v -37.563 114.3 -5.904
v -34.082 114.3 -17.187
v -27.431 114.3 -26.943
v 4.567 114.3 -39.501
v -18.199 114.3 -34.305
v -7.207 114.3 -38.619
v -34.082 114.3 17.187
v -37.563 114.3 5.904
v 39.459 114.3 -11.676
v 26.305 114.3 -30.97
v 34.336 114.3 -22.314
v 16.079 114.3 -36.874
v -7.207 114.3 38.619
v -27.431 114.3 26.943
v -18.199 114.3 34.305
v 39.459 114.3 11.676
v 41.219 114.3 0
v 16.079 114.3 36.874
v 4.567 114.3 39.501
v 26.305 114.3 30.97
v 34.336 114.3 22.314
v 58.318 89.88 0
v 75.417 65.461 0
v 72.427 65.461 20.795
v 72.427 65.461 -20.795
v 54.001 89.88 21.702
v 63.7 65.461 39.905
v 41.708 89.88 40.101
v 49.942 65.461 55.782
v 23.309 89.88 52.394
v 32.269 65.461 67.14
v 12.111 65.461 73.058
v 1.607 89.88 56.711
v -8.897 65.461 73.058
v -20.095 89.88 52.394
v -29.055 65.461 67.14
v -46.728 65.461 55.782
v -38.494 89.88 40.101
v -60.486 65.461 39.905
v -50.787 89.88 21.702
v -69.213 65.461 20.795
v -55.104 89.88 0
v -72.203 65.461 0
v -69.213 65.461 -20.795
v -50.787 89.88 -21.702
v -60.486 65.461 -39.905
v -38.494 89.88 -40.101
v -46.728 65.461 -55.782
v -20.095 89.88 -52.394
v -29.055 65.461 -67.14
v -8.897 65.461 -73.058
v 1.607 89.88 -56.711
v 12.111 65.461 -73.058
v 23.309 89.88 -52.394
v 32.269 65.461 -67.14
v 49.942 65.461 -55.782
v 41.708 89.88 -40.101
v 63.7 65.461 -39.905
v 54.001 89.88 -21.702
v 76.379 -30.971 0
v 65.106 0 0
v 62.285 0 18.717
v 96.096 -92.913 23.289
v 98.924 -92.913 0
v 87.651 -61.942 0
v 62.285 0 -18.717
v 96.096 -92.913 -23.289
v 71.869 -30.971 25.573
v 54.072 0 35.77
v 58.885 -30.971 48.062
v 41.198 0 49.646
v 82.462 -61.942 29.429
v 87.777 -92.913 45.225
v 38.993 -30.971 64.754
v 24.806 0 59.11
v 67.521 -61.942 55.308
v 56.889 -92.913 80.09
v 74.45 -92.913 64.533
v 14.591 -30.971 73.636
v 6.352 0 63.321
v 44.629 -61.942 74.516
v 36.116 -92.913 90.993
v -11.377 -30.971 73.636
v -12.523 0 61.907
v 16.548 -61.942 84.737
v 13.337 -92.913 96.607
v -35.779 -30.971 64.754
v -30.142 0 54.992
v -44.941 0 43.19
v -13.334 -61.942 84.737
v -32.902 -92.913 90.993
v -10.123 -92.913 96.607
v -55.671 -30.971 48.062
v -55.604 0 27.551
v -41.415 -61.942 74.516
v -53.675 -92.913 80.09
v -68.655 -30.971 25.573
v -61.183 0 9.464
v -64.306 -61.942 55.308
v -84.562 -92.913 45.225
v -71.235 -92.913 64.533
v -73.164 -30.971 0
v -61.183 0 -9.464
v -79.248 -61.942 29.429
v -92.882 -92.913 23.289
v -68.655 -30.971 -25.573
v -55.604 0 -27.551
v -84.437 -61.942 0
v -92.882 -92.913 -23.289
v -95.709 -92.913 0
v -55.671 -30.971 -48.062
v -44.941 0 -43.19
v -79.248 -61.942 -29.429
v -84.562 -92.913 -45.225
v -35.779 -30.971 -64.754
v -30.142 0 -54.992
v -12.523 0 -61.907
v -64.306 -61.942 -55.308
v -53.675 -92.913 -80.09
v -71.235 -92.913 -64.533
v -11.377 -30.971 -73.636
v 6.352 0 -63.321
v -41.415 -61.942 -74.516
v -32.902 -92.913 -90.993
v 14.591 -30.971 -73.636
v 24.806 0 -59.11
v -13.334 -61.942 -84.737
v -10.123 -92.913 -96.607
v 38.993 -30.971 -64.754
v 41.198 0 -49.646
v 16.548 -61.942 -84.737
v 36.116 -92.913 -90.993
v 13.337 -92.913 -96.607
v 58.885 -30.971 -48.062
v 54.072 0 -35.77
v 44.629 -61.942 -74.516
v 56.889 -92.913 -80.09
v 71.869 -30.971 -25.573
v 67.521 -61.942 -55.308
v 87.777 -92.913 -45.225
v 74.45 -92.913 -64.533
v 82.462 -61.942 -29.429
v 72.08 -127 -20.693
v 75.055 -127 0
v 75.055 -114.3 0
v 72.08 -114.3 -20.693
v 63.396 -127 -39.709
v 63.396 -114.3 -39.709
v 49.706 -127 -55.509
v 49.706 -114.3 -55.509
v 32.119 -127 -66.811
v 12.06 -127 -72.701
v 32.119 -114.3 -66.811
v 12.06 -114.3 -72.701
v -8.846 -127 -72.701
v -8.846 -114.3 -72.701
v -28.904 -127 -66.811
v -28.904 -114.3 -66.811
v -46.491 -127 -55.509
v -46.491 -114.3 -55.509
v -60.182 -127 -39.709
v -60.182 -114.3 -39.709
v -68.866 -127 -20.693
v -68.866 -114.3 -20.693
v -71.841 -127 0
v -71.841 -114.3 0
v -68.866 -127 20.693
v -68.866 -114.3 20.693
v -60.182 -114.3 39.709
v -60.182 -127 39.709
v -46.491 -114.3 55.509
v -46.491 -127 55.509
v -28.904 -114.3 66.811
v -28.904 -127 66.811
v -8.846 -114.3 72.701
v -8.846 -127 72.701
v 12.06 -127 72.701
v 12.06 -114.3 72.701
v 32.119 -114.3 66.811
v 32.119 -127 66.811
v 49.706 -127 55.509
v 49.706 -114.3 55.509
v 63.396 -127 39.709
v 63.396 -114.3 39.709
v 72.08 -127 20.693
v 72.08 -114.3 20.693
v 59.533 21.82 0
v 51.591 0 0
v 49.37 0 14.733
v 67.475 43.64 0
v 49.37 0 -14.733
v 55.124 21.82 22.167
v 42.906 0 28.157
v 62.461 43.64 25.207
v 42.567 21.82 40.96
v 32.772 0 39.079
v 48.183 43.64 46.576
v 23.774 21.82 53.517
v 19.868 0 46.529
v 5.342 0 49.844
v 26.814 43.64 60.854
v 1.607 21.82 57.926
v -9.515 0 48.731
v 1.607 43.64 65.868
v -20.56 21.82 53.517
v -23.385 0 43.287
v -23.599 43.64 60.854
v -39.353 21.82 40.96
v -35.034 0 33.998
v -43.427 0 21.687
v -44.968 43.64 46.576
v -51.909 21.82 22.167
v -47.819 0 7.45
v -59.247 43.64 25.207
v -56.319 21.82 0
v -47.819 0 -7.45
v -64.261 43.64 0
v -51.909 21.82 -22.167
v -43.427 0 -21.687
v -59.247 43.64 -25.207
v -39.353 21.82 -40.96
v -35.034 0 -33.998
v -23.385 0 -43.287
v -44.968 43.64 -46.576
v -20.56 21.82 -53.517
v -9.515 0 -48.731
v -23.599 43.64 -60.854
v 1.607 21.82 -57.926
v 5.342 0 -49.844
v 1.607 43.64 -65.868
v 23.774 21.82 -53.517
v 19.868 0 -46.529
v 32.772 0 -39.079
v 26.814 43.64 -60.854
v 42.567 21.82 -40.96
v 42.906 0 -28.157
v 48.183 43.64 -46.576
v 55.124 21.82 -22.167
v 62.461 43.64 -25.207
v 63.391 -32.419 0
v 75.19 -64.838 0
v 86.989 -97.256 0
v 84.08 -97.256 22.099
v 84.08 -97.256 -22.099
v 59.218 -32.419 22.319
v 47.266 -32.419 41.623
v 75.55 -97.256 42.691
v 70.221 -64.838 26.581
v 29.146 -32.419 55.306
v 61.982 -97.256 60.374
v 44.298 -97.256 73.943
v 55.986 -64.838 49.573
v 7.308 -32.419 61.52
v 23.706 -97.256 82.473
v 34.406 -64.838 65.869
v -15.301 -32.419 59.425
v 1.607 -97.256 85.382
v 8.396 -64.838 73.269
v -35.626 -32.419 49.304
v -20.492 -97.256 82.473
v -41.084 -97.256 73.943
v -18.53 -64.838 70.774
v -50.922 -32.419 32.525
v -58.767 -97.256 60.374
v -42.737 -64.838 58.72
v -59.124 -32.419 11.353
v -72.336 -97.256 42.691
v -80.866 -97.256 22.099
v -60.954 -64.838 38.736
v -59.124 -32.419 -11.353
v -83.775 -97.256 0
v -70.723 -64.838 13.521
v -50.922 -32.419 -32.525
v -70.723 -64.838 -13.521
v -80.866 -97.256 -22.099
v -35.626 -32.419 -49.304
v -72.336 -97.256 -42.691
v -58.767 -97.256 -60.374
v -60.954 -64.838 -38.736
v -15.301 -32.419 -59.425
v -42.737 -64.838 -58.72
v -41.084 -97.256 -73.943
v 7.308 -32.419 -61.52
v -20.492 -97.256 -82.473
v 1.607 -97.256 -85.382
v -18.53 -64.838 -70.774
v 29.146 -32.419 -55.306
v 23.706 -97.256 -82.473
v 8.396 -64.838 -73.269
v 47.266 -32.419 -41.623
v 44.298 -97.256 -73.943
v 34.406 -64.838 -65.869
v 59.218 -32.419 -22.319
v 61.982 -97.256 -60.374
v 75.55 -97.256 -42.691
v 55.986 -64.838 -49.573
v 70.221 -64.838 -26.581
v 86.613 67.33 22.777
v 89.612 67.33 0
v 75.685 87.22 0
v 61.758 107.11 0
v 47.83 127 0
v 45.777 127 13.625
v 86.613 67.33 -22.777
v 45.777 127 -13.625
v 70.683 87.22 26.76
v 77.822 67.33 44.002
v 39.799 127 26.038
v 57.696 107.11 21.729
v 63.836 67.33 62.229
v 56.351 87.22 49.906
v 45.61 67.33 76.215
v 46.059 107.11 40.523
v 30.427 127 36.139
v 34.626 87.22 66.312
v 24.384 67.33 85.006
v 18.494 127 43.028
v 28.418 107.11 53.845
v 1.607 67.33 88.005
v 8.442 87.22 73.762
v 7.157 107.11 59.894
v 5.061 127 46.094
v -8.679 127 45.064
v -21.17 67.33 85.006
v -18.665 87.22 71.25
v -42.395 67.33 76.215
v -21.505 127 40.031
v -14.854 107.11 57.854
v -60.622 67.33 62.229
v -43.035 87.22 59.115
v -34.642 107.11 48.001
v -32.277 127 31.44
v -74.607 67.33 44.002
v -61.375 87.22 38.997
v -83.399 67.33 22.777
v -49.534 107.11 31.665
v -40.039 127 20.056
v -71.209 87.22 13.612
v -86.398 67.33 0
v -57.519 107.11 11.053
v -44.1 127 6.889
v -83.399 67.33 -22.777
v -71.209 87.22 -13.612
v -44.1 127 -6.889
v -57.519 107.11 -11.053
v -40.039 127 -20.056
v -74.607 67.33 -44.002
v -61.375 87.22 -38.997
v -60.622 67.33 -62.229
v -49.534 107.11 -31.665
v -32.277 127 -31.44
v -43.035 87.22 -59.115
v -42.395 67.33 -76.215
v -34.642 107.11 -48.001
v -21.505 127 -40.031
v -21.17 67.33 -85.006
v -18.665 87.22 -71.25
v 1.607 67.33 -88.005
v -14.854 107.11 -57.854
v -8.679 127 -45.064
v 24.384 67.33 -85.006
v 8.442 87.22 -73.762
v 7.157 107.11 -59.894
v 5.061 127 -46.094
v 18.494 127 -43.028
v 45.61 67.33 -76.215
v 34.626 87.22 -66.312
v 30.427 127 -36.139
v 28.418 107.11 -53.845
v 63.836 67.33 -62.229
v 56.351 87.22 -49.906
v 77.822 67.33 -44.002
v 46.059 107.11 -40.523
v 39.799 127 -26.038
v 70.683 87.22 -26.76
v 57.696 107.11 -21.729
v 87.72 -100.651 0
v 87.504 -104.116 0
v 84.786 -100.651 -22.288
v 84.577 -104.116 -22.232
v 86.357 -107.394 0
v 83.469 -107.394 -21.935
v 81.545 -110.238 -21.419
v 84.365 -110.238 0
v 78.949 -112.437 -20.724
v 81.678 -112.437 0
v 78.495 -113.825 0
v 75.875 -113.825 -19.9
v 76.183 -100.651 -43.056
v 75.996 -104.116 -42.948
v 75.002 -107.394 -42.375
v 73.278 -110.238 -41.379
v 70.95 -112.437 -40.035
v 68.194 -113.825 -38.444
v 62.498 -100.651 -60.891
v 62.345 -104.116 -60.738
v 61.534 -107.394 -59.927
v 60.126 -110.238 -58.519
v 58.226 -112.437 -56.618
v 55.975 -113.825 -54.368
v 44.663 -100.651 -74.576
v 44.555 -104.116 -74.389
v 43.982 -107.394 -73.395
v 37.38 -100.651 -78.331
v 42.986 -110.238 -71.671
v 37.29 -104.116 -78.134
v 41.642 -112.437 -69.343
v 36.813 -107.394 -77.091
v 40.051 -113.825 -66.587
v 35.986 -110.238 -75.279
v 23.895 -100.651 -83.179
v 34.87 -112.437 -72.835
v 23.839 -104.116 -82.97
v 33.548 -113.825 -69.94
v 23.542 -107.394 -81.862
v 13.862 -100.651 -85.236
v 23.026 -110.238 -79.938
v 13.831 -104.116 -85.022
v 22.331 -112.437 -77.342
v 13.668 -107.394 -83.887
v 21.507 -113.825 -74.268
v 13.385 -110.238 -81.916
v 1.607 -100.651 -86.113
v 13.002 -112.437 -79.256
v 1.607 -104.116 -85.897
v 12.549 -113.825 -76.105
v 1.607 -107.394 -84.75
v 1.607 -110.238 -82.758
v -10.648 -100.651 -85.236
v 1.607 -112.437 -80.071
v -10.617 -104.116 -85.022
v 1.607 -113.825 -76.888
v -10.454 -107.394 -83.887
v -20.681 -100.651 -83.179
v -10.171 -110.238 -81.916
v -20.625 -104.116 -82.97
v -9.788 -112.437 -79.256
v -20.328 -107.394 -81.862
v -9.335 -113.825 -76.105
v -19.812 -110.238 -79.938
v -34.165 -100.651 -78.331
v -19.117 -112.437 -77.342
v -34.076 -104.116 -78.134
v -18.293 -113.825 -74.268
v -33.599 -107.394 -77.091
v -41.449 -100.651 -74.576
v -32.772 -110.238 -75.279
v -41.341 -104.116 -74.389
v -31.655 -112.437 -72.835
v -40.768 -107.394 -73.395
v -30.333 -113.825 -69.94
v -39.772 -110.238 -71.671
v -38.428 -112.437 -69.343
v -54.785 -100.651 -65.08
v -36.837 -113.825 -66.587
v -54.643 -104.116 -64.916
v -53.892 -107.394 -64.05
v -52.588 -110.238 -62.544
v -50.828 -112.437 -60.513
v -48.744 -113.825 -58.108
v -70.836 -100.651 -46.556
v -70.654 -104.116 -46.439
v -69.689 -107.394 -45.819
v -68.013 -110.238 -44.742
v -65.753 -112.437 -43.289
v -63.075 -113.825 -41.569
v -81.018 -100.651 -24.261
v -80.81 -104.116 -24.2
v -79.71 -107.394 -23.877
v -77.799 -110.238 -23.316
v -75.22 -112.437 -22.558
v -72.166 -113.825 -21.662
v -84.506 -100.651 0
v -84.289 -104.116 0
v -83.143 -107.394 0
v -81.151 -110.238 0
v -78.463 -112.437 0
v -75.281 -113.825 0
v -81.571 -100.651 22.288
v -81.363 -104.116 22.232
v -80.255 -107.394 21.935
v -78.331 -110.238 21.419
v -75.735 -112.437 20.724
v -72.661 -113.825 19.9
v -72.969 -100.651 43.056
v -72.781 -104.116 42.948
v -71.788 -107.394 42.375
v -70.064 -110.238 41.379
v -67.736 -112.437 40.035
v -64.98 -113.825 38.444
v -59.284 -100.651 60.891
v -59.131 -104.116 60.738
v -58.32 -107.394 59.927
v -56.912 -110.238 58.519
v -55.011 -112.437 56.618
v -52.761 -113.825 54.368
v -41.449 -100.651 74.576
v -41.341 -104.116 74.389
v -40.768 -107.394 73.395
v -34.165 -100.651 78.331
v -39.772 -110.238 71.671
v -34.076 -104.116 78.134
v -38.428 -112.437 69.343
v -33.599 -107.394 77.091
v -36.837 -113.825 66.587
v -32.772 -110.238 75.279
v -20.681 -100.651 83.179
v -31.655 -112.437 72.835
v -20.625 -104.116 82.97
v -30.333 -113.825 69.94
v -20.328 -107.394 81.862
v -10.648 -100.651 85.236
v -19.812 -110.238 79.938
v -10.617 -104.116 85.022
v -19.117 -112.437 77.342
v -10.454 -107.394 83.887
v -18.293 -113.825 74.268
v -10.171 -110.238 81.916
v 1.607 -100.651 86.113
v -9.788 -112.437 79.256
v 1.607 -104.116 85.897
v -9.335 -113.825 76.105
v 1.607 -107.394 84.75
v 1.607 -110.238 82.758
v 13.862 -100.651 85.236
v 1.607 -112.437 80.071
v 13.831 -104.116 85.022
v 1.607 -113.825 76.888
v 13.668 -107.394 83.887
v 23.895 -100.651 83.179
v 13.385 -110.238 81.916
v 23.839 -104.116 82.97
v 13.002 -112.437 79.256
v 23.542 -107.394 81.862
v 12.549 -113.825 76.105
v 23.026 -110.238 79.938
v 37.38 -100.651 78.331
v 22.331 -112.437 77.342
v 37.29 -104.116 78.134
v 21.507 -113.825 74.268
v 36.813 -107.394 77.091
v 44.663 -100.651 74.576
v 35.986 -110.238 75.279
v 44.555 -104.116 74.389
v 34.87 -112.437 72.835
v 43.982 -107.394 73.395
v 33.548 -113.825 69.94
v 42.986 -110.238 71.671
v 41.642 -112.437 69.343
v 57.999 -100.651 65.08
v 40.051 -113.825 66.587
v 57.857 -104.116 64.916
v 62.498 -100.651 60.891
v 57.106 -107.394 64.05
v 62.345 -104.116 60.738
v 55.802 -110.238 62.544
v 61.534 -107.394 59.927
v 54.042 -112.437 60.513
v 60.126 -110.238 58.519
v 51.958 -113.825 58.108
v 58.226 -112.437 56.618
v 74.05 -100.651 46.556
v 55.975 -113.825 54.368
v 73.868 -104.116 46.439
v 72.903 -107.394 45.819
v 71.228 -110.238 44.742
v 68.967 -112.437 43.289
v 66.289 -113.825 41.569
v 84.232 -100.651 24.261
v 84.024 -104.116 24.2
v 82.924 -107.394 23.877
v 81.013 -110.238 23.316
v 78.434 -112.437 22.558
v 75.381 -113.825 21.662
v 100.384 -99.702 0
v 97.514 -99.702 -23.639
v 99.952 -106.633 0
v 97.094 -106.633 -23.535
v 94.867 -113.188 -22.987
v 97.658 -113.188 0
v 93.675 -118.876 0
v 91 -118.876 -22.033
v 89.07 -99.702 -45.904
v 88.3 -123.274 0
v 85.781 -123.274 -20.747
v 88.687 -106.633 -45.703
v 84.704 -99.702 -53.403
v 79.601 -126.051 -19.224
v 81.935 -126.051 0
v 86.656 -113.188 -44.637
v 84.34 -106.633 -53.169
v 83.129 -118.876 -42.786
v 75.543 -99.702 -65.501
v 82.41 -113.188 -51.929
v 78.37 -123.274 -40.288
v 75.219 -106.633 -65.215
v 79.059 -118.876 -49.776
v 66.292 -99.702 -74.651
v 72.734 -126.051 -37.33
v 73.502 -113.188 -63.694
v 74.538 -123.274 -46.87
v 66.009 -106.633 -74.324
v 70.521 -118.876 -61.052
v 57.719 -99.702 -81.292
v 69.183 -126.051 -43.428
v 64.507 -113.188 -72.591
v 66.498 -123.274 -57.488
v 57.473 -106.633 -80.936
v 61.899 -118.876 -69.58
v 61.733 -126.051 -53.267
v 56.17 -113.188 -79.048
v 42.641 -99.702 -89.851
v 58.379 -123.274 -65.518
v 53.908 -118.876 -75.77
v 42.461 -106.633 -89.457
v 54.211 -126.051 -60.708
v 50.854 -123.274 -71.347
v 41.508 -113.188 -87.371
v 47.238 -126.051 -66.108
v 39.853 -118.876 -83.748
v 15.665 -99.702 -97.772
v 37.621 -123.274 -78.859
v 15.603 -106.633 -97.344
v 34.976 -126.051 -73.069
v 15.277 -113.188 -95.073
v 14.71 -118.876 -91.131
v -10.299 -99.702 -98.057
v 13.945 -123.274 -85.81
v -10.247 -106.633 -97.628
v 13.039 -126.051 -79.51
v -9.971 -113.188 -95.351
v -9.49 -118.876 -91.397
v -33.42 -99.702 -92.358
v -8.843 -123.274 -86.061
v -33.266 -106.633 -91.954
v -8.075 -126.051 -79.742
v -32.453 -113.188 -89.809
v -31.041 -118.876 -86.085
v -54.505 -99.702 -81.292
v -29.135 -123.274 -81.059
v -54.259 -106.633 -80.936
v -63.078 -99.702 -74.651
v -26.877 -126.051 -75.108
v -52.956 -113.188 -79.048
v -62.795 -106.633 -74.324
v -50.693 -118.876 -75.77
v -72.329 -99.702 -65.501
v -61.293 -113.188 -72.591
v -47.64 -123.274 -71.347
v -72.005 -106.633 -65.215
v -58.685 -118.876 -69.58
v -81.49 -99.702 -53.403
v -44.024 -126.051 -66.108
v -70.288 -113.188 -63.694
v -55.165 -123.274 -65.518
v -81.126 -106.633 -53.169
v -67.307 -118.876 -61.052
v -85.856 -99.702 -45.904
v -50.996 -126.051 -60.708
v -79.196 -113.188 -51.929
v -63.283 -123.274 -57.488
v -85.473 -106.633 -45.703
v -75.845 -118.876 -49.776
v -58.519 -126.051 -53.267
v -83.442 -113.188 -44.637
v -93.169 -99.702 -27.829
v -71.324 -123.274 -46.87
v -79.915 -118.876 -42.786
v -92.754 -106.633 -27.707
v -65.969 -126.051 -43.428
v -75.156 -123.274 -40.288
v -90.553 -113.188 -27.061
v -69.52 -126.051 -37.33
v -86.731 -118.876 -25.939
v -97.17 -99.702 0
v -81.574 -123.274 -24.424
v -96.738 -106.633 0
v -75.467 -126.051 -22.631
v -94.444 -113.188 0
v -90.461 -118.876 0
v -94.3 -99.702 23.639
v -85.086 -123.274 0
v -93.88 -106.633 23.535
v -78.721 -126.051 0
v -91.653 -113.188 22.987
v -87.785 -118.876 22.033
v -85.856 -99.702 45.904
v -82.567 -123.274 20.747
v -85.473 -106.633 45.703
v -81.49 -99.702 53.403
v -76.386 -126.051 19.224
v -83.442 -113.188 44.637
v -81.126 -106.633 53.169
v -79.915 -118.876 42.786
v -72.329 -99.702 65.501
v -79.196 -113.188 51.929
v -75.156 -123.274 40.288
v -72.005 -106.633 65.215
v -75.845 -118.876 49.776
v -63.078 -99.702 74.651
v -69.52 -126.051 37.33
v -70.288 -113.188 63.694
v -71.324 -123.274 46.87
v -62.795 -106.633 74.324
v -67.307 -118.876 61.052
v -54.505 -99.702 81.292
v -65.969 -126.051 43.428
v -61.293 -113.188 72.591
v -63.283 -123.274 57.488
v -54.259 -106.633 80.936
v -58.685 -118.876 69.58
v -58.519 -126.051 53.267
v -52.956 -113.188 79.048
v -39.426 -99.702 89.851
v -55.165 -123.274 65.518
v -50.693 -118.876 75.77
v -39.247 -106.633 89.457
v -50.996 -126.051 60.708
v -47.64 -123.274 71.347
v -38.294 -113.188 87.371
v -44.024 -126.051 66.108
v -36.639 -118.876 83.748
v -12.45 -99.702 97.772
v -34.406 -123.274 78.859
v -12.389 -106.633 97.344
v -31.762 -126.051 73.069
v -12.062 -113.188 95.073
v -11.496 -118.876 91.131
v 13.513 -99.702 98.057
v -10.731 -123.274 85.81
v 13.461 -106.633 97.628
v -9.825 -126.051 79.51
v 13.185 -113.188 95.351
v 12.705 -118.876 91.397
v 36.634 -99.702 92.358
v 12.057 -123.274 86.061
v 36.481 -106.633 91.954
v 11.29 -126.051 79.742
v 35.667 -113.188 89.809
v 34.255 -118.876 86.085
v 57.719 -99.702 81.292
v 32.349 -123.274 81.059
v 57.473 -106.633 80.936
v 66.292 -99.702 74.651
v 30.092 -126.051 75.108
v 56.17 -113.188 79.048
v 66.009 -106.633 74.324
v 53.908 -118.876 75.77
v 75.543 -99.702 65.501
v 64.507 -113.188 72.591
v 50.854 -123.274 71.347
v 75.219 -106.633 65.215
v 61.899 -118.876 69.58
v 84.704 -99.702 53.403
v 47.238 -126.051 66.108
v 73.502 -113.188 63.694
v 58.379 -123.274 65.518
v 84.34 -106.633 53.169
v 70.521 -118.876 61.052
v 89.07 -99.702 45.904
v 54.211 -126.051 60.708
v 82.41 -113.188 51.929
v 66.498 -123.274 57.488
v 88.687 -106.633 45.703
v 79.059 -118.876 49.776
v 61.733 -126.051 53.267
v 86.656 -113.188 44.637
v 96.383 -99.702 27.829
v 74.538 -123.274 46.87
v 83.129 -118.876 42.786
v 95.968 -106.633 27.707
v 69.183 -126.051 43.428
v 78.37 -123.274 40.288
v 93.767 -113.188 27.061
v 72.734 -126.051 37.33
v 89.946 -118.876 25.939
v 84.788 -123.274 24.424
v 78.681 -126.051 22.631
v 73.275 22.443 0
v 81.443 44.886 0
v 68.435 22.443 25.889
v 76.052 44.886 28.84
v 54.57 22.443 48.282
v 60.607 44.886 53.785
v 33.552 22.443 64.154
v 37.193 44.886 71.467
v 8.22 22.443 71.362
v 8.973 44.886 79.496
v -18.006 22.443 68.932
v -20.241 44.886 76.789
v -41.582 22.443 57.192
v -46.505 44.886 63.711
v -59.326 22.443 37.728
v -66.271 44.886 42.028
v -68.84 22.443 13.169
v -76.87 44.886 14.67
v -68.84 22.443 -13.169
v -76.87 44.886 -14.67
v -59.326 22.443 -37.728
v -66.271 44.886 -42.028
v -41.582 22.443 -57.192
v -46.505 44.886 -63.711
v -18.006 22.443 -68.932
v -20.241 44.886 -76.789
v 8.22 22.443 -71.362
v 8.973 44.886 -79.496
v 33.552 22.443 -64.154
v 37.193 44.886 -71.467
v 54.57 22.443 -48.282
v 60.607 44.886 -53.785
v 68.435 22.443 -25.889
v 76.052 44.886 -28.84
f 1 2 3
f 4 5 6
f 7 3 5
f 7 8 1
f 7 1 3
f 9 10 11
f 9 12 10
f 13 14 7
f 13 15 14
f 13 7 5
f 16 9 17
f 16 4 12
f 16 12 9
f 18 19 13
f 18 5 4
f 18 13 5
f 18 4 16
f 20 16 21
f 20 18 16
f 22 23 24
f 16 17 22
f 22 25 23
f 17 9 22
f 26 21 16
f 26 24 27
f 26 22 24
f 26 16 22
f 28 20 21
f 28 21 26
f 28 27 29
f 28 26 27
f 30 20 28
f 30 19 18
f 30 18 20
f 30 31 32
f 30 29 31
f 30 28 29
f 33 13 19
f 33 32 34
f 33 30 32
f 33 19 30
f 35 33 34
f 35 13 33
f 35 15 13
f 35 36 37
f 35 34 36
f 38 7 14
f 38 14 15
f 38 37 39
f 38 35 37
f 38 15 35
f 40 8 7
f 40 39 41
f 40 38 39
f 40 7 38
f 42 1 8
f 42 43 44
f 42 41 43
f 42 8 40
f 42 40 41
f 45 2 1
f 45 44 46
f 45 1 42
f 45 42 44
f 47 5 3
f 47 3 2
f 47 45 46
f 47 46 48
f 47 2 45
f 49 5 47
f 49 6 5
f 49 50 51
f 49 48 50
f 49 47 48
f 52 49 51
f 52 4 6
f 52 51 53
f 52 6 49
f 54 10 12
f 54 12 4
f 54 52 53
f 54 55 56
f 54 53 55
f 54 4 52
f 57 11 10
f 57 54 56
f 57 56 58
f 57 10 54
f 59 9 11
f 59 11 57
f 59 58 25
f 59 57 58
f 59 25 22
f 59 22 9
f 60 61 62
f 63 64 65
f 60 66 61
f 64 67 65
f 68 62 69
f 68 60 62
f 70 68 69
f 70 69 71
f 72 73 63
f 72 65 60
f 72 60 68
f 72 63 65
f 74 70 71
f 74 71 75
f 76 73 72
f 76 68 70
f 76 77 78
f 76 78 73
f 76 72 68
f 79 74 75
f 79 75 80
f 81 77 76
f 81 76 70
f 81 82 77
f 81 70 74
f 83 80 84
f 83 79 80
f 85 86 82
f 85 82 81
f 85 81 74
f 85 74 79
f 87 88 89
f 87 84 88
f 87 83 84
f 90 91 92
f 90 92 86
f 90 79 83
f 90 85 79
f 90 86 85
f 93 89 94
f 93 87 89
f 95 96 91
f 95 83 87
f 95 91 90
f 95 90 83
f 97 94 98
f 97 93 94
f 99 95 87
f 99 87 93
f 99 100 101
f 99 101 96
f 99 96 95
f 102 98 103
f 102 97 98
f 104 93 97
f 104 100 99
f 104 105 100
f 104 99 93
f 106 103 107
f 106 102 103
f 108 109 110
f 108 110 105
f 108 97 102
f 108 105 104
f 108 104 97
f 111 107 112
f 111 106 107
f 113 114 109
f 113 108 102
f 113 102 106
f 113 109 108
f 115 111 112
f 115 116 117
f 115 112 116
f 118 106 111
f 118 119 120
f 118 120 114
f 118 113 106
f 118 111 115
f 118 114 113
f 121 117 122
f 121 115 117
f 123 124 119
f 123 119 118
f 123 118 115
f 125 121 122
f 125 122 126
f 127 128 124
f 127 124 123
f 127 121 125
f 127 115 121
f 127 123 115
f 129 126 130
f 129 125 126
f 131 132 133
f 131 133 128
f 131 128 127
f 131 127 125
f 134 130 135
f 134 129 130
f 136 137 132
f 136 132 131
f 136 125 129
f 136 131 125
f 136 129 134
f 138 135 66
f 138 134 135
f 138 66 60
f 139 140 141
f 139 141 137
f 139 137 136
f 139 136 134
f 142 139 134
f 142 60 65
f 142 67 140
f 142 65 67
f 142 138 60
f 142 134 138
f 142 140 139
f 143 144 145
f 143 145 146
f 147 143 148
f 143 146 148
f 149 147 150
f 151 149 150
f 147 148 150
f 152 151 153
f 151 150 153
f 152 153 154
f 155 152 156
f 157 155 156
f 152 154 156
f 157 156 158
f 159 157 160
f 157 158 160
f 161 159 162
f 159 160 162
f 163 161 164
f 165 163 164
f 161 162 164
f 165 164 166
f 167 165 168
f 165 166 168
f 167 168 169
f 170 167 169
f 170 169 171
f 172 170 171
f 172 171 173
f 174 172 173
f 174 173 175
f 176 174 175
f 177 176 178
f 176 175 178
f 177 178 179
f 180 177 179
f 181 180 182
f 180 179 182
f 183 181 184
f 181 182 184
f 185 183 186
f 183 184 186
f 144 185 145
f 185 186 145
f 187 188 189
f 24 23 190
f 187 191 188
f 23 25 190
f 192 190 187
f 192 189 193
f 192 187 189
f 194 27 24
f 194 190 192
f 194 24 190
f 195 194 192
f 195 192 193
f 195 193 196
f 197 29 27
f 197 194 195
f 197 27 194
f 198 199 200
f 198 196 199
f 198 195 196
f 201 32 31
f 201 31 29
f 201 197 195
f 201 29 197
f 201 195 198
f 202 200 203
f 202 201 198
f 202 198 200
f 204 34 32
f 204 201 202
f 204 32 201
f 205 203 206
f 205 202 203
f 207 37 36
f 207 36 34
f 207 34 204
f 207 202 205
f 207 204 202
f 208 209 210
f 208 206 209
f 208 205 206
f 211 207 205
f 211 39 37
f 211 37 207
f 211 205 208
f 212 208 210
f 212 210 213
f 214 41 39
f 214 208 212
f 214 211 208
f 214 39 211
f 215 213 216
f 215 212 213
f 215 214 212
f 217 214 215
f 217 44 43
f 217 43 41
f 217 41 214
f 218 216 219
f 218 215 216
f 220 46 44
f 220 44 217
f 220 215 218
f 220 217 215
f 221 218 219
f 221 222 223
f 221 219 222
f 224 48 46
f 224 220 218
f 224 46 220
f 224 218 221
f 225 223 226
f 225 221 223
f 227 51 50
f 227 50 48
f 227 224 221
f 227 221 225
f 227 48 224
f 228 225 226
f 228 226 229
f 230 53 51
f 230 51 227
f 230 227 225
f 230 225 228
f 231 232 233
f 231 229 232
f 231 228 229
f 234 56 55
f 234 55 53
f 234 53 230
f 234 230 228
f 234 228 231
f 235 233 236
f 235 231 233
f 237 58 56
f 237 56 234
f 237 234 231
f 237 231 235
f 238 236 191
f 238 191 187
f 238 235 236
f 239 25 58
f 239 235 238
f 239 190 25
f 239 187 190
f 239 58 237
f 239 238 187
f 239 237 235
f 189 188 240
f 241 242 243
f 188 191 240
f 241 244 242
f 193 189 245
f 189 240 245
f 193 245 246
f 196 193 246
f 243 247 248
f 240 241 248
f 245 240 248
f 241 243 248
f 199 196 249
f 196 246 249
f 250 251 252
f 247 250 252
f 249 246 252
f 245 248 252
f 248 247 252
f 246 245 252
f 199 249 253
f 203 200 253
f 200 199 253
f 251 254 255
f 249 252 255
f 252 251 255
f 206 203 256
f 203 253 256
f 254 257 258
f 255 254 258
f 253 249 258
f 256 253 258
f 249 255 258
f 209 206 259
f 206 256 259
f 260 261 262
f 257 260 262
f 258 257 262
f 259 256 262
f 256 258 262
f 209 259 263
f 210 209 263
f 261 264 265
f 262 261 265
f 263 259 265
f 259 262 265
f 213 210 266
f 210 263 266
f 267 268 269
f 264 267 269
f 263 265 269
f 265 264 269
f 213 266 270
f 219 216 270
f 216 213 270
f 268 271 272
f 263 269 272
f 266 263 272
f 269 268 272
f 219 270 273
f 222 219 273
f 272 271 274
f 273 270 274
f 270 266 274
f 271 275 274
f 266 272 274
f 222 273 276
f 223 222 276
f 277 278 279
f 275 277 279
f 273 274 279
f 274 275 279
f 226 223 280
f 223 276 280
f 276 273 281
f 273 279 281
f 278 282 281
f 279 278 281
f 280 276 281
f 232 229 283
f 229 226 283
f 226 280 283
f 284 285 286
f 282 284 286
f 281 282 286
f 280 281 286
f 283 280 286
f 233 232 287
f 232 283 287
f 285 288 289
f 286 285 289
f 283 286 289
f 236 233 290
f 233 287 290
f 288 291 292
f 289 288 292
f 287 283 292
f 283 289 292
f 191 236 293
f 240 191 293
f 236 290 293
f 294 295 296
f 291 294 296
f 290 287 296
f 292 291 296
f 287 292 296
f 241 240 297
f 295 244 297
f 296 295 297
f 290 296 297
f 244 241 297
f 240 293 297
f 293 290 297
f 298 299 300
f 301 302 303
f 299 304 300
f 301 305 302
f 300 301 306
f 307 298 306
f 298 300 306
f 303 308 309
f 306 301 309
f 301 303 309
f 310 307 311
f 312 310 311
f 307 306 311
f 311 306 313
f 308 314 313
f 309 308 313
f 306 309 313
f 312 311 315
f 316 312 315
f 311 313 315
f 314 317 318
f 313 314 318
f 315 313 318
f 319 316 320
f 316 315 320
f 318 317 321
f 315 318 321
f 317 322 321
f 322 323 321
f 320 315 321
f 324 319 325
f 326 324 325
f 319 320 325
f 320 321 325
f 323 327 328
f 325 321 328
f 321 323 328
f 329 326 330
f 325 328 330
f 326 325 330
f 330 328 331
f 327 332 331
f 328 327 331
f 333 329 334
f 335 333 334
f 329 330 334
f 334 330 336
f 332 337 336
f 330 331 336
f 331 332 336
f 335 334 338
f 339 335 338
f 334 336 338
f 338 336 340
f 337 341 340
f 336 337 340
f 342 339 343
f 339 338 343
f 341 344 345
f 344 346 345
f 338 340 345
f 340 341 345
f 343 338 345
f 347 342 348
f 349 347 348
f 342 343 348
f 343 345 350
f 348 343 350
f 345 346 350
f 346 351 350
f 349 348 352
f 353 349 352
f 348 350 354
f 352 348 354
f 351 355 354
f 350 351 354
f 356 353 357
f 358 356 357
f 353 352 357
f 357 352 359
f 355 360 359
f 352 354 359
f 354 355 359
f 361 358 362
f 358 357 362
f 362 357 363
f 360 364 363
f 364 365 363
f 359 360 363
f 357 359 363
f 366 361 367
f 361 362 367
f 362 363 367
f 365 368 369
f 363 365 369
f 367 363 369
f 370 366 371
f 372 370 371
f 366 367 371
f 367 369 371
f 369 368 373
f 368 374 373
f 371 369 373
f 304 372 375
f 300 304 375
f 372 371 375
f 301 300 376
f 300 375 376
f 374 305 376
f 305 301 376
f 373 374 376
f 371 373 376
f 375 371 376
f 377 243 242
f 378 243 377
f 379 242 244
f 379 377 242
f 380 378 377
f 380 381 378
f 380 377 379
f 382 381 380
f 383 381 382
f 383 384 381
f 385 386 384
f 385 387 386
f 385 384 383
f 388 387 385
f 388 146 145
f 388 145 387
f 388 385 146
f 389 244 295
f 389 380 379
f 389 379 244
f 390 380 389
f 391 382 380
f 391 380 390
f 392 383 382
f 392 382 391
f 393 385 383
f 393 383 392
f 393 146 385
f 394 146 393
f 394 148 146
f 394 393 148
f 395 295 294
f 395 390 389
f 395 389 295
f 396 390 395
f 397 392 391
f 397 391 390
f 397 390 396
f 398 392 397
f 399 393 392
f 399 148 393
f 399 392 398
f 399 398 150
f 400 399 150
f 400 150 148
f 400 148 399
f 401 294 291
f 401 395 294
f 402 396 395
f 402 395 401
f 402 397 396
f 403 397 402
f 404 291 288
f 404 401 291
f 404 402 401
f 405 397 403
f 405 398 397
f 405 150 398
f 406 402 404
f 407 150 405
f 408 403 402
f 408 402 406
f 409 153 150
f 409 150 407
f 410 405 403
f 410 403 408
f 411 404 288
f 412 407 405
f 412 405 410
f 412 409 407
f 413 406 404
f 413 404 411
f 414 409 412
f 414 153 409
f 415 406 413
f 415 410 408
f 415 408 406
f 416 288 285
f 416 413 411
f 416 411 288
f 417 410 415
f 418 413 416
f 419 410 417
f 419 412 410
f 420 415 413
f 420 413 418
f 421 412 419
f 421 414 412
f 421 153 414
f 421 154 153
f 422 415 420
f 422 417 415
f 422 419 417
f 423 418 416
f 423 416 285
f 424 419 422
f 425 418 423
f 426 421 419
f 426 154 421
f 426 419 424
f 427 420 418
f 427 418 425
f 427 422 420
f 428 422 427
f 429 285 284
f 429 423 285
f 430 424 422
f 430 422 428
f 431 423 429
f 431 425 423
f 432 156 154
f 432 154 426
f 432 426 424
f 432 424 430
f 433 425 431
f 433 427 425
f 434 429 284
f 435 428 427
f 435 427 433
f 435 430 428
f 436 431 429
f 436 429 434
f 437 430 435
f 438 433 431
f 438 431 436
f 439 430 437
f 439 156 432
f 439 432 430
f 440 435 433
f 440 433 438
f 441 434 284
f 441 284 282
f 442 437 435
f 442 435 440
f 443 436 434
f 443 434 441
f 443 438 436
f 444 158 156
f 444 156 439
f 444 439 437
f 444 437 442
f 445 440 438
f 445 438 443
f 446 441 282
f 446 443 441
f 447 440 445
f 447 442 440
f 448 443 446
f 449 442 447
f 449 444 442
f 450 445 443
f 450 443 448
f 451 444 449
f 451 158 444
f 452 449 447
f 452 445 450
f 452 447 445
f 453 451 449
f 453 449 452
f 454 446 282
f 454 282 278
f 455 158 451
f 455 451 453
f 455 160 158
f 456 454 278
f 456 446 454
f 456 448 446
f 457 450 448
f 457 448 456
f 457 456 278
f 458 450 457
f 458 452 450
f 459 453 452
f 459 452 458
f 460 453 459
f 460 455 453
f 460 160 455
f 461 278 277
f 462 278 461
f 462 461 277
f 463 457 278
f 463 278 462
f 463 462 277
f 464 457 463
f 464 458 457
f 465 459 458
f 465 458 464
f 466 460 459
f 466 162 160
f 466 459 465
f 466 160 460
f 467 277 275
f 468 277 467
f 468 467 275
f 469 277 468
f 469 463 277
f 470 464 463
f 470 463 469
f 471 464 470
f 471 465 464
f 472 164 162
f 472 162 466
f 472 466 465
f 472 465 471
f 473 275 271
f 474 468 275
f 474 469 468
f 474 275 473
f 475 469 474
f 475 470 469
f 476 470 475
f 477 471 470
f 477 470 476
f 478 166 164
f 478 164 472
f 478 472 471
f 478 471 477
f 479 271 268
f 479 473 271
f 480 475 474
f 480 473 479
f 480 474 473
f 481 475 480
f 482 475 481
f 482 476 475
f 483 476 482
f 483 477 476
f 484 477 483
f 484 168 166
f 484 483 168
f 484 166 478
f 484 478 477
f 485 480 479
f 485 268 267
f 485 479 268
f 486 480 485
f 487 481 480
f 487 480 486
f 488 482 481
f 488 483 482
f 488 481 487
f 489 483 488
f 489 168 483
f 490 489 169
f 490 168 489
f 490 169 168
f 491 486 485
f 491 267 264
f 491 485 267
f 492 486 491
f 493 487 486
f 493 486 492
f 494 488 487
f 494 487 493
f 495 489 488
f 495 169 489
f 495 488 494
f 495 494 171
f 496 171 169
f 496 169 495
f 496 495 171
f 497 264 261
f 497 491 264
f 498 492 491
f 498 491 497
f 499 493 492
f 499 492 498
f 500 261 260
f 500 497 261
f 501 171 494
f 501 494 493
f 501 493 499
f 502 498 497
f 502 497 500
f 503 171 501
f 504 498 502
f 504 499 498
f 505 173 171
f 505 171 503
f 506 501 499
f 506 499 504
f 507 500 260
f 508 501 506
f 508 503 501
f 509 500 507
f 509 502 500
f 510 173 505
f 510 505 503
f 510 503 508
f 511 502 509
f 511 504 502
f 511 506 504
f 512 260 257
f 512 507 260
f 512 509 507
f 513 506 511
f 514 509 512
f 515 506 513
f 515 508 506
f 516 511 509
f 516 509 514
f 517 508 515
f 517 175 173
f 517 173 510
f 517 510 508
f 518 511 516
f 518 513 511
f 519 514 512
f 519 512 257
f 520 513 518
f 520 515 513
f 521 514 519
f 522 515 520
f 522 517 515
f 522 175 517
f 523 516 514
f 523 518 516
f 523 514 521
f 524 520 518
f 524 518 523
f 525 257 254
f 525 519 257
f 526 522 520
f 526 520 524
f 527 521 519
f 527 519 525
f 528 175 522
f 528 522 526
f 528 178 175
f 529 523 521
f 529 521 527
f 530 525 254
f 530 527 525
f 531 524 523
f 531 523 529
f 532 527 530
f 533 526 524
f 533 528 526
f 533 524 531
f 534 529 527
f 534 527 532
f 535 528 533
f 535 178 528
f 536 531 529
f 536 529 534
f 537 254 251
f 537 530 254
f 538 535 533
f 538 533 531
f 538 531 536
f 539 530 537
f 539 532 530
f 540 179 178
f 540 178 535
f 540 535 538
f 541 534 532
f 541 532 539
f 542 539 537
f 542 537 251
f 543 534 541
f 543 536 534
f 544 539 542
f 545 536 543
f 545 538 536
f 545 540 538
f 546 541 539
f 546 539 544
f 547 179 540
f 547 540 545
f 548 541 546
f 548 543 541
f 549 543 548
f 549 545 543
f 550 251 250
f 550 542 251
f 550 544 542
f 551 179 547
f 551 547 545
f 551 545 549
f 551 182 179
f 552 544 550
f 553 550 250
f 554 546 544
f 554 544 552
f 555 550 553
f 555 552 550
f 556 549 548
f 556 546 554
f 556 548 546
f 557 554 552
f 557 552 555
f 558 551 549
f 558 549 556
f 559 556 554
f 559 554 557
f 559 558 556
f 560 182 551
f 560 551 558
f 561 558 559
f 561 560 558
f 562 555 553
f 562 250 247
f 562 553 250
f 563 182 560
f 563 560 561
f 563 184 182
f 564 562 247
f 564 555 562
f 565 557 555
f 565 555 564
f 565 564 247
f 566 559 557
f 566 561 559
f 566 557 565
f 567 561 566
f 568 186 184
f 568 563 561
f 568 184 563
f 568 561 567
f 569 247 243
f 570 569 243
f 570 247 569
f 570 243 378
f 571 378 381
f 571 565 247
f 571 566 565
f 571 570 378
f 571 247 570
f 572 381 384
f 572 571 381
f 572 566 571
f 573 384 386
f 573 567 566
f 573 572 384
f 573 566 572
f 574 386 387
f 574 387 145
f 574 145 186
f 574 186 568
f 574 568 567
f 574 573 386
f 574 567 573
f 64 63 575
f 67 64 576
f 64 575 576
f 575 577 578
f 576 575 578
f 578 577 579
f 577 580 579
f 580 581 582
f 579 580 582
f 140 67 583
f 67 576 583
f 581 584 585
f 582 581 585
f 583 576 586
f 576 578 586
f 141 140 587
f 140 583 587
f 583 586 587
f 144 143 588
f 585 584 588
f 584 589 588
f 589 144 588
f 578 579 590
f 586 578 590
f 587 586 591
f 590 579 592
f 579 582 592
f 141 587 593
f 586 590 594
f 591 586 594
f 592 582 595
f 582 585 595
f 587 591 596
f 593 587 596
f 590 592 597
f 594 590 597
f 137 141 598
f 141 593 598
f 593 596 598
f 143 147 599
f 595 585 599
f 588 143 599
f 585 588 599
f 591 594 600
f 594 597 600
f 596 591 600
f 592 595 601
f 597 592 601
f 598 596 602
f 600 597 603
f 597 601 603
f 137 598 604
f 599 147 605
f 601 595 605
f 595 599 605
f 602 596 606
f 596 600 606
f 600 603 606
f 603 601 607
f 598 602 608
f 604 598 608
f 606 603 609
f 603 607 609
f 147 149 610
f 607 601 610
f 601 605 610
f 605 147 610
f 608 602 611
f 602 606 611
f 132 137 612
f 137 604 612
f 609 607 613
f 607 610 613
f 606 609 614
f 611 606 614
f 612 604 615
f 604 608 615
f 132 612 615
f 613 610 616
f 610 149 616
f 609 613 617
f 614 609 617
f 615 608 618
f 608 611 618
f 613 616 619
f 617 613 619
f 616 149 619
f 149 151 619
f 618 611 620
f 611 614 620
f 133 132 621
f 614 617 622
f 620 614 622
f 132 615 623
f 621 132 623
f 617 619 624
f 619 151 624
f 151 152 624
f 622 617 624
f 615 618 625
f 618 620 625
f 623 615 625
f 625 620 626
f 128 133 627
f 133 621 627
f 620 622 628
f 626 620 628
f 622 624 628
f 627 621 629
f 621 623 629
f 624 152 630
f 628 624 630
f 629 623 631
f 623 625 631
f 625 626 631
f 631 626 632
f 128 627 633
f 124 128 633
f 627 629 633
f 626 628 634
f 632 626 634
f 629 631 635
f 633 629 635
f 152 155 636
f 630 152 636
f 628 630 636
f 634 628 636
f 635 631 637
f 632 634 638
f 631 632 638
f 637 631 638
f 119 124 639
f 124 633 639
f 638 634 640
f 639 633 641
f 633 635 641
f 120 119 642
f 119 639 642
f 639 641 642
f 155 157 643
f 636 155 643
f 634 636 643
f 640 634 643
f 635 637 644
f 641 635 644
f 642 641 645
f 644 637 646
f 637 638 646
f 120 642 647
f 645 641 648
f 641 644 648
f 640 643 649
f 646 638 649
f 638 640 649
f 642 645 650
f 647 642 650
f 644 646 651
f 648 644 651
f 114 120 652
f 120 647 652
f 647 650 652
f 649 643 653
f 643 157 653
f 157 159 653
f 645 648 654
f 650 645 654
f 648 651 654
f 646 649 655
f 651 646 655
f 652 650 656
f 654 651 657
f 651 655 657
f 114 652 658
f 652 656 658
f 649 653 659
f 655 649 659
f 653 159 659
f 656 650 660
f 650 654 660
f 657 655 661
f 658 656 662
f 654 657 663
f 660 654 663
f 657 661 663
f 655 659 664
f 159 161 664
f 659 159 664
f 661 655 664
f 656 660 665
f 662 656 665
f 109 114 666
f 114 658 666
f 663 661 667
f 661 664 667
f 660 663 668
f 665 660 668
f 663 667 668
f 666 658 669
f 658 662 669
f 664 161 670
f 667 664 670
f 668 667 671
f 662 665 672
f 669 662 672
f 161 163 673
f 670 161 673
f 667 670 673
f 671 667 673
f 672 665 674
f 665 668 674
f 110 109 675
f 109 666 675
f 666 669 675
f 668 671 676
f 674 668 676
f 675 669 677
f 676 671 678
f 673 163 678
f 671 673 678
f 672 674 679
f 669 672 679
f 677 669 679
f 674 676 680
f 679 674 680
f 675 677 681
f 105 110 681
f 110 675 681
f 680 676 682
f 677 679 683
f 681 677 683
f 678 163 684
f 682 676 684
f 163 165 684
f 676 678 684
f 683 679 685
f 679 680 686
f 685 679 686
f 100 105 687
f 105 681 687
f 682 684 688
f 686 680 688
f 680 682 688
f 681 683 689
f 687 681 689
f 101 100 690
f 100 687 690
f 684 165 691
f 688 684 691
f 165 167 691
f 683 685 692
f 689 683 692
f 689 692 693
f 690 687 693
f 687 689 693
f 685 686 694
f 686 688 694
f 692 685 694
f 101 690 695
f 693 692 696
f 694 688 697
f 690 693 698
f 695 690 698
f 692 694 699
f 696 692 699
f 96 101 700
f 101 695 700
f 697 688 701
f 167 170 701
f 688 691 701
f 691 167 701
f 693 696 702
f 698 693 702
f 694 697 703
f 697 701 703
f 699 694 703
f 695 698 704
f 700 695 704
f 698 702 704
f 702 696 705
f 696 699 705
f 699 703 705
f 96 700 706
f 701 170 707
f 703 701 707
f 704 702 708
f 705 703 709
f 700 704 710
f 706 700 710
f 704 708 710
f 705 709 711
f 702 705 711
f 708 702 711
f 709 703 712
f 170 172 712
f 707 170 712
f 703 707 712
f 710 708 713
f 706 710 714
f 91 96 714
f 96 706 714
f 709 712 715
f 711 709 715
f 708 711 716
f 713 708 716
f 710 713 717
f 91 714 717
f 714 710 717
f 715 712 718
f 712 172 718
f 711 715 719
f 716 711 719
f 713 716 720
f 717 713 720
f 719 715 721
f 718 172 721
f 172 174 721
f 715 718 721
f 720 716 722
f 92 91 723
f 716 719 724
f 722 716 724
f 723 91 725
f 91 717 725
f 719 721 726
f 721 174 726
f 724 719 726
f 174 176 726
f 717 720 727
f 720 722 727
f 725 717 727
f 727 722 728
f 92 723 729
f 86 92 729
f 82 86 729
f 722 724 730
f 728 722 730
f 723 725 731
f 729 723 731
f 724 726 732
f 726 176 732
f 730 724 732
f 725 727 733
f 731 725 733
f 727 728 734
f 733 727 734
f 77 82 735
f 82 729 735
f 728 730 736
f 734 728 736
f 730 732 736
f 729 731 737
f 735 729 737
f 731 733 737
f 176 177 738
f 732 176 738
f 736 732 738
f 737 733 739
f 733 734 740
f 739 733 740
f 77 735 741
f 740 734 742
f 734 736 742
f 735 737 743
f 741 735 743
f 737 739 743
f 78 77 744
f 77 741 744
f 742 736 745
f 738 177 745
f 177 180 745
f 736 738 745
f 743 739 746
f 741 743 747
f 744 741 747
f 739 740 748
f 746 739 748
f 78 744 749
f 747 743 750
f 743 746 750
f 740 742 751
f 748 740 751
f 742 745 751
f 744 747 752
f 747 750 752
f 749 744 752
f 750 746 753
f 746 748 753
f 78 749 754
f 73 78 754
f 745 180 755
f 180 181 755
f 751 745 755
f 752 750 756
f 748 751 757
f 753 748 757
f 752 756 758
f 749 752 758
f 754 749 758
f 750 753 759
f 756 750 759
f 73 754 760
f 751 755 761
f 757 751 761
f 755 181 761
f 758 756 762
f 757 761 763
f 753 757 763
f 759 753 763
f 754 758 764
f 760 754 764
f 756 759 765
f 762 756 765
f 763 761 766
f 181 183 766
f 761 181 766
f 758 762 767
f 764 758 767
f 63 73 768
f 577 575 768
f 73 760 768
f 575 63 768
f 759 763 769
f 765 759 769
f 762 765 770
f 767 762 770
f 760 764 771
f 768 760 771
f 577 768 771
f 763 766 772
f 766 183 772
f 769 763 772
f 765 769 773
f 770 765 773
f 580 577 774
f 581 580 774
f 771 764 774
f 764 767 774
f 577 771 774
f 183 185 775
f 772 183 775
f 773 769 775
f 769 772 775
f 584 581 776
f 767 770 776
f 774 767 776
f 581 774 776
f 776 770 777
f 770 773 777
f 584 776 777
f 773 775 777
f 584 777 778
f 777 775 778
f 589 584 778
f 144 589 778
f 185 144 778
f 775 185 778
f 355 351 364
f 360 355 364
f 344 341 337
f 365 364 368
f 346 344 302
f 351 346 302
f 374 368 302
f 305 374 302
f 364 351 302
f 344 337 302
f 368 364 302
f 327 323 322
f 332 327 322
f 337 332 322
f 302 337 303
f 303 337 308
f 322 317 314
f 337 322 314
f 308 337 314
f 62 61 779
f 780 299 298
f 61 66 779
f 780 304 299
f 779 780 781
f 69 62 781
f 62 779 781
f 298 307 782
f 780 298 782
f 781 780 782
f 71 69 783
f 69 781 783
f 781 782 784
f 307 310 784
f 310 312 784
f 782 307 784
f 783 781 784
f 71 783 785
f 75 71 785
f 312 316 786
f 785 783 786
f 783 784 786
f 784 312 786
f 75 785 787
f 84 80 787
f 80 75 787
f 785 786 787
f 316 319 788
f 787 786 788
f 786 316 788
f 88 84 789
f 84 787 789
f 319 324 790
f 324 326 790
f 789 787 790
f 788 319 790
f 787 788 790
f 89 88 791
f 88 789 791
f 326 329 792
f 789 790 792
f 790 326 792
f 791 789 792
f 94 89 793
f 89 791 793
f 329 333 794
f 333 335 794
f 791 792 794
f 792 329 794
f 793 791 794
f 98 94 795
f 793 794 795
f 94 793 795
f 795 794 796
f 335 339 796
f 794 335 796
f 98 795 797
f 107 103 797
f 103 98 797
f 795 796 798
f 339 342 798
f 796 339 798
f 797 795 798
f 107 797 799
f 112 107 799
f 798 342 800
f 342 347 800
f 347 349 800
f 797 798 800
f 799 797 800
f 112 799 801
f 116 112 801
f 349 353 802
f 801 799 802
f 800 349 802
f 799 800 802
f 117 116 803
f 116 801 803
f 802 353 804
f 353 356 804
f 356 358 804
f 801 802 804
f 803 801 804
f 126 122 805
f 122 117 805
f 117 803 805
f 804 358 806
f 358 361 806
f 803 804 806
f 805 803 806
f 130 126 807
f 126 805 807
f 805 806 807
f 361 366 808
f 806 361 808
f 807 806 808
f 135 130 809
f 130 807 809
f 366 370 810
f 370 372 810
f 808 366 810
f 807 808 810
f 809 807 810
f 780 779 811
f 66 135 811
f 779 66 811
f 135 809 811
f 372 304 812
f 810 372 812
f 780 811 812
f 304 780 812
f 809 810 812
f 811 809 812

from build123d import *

# Parameters (mm, degrees)
F0_R     = 63.4990492705
F1_DEPTH = 127
F1_TAPER = -20
F2_R     = 25.4
F3_SIZE  = 63.5
F4_T     = -12.7


# Not quite as in the source:
# - a shell that OpenCascade refuses in one call is made with other operations: the cavity is built on its own and cut out


with BuildPart() as f1:
    # F0 (on Front) → F1 (new body, symmetric)
    with BuildSketch(Plane.XZ):
        with Locations((1.6070879065, 0)):
            Circle(F0_R)
    extrude(amount=F1_DEPTH, both=True, taper=F1_TAPER)

    # F2
    f2_edges = [f1.edges().sort_by_distance(p)[0] for p in [
        (-108.116181, -127, 0),
    ]]
    fillet(f2_edges, radius=F2_R)

    # F3
    f3_edges = [f1.edges().sort_by_distance(p)[0] for p in [
        (-108.116181, 127, 0),
    ]]
    chamfer(f3_edges, length=F3_SIZE)

    # F4: a shell. OpenCascade refuses it in one call, so the cavity is built on its own and cut out:
    # the body offset inwards by the wall thickness, plus a prism from it out through each open face.
    f4_core = offset(f1.part, amount=F4_T, kind=Kind.INTERSECTION, mode=Mode.PRIVATE)
    f4_exits = [f4_core.faces().sort_by_distance(p)[0] for p in [
        (1.607088, -114.3, 0),
    ]]
    add(f4_core, mode=Mode.SUBTRACT)
    extrude(f4_exits, amount=-F4_T, mode=Mode.SUBTRACT)


solid = f1.part
